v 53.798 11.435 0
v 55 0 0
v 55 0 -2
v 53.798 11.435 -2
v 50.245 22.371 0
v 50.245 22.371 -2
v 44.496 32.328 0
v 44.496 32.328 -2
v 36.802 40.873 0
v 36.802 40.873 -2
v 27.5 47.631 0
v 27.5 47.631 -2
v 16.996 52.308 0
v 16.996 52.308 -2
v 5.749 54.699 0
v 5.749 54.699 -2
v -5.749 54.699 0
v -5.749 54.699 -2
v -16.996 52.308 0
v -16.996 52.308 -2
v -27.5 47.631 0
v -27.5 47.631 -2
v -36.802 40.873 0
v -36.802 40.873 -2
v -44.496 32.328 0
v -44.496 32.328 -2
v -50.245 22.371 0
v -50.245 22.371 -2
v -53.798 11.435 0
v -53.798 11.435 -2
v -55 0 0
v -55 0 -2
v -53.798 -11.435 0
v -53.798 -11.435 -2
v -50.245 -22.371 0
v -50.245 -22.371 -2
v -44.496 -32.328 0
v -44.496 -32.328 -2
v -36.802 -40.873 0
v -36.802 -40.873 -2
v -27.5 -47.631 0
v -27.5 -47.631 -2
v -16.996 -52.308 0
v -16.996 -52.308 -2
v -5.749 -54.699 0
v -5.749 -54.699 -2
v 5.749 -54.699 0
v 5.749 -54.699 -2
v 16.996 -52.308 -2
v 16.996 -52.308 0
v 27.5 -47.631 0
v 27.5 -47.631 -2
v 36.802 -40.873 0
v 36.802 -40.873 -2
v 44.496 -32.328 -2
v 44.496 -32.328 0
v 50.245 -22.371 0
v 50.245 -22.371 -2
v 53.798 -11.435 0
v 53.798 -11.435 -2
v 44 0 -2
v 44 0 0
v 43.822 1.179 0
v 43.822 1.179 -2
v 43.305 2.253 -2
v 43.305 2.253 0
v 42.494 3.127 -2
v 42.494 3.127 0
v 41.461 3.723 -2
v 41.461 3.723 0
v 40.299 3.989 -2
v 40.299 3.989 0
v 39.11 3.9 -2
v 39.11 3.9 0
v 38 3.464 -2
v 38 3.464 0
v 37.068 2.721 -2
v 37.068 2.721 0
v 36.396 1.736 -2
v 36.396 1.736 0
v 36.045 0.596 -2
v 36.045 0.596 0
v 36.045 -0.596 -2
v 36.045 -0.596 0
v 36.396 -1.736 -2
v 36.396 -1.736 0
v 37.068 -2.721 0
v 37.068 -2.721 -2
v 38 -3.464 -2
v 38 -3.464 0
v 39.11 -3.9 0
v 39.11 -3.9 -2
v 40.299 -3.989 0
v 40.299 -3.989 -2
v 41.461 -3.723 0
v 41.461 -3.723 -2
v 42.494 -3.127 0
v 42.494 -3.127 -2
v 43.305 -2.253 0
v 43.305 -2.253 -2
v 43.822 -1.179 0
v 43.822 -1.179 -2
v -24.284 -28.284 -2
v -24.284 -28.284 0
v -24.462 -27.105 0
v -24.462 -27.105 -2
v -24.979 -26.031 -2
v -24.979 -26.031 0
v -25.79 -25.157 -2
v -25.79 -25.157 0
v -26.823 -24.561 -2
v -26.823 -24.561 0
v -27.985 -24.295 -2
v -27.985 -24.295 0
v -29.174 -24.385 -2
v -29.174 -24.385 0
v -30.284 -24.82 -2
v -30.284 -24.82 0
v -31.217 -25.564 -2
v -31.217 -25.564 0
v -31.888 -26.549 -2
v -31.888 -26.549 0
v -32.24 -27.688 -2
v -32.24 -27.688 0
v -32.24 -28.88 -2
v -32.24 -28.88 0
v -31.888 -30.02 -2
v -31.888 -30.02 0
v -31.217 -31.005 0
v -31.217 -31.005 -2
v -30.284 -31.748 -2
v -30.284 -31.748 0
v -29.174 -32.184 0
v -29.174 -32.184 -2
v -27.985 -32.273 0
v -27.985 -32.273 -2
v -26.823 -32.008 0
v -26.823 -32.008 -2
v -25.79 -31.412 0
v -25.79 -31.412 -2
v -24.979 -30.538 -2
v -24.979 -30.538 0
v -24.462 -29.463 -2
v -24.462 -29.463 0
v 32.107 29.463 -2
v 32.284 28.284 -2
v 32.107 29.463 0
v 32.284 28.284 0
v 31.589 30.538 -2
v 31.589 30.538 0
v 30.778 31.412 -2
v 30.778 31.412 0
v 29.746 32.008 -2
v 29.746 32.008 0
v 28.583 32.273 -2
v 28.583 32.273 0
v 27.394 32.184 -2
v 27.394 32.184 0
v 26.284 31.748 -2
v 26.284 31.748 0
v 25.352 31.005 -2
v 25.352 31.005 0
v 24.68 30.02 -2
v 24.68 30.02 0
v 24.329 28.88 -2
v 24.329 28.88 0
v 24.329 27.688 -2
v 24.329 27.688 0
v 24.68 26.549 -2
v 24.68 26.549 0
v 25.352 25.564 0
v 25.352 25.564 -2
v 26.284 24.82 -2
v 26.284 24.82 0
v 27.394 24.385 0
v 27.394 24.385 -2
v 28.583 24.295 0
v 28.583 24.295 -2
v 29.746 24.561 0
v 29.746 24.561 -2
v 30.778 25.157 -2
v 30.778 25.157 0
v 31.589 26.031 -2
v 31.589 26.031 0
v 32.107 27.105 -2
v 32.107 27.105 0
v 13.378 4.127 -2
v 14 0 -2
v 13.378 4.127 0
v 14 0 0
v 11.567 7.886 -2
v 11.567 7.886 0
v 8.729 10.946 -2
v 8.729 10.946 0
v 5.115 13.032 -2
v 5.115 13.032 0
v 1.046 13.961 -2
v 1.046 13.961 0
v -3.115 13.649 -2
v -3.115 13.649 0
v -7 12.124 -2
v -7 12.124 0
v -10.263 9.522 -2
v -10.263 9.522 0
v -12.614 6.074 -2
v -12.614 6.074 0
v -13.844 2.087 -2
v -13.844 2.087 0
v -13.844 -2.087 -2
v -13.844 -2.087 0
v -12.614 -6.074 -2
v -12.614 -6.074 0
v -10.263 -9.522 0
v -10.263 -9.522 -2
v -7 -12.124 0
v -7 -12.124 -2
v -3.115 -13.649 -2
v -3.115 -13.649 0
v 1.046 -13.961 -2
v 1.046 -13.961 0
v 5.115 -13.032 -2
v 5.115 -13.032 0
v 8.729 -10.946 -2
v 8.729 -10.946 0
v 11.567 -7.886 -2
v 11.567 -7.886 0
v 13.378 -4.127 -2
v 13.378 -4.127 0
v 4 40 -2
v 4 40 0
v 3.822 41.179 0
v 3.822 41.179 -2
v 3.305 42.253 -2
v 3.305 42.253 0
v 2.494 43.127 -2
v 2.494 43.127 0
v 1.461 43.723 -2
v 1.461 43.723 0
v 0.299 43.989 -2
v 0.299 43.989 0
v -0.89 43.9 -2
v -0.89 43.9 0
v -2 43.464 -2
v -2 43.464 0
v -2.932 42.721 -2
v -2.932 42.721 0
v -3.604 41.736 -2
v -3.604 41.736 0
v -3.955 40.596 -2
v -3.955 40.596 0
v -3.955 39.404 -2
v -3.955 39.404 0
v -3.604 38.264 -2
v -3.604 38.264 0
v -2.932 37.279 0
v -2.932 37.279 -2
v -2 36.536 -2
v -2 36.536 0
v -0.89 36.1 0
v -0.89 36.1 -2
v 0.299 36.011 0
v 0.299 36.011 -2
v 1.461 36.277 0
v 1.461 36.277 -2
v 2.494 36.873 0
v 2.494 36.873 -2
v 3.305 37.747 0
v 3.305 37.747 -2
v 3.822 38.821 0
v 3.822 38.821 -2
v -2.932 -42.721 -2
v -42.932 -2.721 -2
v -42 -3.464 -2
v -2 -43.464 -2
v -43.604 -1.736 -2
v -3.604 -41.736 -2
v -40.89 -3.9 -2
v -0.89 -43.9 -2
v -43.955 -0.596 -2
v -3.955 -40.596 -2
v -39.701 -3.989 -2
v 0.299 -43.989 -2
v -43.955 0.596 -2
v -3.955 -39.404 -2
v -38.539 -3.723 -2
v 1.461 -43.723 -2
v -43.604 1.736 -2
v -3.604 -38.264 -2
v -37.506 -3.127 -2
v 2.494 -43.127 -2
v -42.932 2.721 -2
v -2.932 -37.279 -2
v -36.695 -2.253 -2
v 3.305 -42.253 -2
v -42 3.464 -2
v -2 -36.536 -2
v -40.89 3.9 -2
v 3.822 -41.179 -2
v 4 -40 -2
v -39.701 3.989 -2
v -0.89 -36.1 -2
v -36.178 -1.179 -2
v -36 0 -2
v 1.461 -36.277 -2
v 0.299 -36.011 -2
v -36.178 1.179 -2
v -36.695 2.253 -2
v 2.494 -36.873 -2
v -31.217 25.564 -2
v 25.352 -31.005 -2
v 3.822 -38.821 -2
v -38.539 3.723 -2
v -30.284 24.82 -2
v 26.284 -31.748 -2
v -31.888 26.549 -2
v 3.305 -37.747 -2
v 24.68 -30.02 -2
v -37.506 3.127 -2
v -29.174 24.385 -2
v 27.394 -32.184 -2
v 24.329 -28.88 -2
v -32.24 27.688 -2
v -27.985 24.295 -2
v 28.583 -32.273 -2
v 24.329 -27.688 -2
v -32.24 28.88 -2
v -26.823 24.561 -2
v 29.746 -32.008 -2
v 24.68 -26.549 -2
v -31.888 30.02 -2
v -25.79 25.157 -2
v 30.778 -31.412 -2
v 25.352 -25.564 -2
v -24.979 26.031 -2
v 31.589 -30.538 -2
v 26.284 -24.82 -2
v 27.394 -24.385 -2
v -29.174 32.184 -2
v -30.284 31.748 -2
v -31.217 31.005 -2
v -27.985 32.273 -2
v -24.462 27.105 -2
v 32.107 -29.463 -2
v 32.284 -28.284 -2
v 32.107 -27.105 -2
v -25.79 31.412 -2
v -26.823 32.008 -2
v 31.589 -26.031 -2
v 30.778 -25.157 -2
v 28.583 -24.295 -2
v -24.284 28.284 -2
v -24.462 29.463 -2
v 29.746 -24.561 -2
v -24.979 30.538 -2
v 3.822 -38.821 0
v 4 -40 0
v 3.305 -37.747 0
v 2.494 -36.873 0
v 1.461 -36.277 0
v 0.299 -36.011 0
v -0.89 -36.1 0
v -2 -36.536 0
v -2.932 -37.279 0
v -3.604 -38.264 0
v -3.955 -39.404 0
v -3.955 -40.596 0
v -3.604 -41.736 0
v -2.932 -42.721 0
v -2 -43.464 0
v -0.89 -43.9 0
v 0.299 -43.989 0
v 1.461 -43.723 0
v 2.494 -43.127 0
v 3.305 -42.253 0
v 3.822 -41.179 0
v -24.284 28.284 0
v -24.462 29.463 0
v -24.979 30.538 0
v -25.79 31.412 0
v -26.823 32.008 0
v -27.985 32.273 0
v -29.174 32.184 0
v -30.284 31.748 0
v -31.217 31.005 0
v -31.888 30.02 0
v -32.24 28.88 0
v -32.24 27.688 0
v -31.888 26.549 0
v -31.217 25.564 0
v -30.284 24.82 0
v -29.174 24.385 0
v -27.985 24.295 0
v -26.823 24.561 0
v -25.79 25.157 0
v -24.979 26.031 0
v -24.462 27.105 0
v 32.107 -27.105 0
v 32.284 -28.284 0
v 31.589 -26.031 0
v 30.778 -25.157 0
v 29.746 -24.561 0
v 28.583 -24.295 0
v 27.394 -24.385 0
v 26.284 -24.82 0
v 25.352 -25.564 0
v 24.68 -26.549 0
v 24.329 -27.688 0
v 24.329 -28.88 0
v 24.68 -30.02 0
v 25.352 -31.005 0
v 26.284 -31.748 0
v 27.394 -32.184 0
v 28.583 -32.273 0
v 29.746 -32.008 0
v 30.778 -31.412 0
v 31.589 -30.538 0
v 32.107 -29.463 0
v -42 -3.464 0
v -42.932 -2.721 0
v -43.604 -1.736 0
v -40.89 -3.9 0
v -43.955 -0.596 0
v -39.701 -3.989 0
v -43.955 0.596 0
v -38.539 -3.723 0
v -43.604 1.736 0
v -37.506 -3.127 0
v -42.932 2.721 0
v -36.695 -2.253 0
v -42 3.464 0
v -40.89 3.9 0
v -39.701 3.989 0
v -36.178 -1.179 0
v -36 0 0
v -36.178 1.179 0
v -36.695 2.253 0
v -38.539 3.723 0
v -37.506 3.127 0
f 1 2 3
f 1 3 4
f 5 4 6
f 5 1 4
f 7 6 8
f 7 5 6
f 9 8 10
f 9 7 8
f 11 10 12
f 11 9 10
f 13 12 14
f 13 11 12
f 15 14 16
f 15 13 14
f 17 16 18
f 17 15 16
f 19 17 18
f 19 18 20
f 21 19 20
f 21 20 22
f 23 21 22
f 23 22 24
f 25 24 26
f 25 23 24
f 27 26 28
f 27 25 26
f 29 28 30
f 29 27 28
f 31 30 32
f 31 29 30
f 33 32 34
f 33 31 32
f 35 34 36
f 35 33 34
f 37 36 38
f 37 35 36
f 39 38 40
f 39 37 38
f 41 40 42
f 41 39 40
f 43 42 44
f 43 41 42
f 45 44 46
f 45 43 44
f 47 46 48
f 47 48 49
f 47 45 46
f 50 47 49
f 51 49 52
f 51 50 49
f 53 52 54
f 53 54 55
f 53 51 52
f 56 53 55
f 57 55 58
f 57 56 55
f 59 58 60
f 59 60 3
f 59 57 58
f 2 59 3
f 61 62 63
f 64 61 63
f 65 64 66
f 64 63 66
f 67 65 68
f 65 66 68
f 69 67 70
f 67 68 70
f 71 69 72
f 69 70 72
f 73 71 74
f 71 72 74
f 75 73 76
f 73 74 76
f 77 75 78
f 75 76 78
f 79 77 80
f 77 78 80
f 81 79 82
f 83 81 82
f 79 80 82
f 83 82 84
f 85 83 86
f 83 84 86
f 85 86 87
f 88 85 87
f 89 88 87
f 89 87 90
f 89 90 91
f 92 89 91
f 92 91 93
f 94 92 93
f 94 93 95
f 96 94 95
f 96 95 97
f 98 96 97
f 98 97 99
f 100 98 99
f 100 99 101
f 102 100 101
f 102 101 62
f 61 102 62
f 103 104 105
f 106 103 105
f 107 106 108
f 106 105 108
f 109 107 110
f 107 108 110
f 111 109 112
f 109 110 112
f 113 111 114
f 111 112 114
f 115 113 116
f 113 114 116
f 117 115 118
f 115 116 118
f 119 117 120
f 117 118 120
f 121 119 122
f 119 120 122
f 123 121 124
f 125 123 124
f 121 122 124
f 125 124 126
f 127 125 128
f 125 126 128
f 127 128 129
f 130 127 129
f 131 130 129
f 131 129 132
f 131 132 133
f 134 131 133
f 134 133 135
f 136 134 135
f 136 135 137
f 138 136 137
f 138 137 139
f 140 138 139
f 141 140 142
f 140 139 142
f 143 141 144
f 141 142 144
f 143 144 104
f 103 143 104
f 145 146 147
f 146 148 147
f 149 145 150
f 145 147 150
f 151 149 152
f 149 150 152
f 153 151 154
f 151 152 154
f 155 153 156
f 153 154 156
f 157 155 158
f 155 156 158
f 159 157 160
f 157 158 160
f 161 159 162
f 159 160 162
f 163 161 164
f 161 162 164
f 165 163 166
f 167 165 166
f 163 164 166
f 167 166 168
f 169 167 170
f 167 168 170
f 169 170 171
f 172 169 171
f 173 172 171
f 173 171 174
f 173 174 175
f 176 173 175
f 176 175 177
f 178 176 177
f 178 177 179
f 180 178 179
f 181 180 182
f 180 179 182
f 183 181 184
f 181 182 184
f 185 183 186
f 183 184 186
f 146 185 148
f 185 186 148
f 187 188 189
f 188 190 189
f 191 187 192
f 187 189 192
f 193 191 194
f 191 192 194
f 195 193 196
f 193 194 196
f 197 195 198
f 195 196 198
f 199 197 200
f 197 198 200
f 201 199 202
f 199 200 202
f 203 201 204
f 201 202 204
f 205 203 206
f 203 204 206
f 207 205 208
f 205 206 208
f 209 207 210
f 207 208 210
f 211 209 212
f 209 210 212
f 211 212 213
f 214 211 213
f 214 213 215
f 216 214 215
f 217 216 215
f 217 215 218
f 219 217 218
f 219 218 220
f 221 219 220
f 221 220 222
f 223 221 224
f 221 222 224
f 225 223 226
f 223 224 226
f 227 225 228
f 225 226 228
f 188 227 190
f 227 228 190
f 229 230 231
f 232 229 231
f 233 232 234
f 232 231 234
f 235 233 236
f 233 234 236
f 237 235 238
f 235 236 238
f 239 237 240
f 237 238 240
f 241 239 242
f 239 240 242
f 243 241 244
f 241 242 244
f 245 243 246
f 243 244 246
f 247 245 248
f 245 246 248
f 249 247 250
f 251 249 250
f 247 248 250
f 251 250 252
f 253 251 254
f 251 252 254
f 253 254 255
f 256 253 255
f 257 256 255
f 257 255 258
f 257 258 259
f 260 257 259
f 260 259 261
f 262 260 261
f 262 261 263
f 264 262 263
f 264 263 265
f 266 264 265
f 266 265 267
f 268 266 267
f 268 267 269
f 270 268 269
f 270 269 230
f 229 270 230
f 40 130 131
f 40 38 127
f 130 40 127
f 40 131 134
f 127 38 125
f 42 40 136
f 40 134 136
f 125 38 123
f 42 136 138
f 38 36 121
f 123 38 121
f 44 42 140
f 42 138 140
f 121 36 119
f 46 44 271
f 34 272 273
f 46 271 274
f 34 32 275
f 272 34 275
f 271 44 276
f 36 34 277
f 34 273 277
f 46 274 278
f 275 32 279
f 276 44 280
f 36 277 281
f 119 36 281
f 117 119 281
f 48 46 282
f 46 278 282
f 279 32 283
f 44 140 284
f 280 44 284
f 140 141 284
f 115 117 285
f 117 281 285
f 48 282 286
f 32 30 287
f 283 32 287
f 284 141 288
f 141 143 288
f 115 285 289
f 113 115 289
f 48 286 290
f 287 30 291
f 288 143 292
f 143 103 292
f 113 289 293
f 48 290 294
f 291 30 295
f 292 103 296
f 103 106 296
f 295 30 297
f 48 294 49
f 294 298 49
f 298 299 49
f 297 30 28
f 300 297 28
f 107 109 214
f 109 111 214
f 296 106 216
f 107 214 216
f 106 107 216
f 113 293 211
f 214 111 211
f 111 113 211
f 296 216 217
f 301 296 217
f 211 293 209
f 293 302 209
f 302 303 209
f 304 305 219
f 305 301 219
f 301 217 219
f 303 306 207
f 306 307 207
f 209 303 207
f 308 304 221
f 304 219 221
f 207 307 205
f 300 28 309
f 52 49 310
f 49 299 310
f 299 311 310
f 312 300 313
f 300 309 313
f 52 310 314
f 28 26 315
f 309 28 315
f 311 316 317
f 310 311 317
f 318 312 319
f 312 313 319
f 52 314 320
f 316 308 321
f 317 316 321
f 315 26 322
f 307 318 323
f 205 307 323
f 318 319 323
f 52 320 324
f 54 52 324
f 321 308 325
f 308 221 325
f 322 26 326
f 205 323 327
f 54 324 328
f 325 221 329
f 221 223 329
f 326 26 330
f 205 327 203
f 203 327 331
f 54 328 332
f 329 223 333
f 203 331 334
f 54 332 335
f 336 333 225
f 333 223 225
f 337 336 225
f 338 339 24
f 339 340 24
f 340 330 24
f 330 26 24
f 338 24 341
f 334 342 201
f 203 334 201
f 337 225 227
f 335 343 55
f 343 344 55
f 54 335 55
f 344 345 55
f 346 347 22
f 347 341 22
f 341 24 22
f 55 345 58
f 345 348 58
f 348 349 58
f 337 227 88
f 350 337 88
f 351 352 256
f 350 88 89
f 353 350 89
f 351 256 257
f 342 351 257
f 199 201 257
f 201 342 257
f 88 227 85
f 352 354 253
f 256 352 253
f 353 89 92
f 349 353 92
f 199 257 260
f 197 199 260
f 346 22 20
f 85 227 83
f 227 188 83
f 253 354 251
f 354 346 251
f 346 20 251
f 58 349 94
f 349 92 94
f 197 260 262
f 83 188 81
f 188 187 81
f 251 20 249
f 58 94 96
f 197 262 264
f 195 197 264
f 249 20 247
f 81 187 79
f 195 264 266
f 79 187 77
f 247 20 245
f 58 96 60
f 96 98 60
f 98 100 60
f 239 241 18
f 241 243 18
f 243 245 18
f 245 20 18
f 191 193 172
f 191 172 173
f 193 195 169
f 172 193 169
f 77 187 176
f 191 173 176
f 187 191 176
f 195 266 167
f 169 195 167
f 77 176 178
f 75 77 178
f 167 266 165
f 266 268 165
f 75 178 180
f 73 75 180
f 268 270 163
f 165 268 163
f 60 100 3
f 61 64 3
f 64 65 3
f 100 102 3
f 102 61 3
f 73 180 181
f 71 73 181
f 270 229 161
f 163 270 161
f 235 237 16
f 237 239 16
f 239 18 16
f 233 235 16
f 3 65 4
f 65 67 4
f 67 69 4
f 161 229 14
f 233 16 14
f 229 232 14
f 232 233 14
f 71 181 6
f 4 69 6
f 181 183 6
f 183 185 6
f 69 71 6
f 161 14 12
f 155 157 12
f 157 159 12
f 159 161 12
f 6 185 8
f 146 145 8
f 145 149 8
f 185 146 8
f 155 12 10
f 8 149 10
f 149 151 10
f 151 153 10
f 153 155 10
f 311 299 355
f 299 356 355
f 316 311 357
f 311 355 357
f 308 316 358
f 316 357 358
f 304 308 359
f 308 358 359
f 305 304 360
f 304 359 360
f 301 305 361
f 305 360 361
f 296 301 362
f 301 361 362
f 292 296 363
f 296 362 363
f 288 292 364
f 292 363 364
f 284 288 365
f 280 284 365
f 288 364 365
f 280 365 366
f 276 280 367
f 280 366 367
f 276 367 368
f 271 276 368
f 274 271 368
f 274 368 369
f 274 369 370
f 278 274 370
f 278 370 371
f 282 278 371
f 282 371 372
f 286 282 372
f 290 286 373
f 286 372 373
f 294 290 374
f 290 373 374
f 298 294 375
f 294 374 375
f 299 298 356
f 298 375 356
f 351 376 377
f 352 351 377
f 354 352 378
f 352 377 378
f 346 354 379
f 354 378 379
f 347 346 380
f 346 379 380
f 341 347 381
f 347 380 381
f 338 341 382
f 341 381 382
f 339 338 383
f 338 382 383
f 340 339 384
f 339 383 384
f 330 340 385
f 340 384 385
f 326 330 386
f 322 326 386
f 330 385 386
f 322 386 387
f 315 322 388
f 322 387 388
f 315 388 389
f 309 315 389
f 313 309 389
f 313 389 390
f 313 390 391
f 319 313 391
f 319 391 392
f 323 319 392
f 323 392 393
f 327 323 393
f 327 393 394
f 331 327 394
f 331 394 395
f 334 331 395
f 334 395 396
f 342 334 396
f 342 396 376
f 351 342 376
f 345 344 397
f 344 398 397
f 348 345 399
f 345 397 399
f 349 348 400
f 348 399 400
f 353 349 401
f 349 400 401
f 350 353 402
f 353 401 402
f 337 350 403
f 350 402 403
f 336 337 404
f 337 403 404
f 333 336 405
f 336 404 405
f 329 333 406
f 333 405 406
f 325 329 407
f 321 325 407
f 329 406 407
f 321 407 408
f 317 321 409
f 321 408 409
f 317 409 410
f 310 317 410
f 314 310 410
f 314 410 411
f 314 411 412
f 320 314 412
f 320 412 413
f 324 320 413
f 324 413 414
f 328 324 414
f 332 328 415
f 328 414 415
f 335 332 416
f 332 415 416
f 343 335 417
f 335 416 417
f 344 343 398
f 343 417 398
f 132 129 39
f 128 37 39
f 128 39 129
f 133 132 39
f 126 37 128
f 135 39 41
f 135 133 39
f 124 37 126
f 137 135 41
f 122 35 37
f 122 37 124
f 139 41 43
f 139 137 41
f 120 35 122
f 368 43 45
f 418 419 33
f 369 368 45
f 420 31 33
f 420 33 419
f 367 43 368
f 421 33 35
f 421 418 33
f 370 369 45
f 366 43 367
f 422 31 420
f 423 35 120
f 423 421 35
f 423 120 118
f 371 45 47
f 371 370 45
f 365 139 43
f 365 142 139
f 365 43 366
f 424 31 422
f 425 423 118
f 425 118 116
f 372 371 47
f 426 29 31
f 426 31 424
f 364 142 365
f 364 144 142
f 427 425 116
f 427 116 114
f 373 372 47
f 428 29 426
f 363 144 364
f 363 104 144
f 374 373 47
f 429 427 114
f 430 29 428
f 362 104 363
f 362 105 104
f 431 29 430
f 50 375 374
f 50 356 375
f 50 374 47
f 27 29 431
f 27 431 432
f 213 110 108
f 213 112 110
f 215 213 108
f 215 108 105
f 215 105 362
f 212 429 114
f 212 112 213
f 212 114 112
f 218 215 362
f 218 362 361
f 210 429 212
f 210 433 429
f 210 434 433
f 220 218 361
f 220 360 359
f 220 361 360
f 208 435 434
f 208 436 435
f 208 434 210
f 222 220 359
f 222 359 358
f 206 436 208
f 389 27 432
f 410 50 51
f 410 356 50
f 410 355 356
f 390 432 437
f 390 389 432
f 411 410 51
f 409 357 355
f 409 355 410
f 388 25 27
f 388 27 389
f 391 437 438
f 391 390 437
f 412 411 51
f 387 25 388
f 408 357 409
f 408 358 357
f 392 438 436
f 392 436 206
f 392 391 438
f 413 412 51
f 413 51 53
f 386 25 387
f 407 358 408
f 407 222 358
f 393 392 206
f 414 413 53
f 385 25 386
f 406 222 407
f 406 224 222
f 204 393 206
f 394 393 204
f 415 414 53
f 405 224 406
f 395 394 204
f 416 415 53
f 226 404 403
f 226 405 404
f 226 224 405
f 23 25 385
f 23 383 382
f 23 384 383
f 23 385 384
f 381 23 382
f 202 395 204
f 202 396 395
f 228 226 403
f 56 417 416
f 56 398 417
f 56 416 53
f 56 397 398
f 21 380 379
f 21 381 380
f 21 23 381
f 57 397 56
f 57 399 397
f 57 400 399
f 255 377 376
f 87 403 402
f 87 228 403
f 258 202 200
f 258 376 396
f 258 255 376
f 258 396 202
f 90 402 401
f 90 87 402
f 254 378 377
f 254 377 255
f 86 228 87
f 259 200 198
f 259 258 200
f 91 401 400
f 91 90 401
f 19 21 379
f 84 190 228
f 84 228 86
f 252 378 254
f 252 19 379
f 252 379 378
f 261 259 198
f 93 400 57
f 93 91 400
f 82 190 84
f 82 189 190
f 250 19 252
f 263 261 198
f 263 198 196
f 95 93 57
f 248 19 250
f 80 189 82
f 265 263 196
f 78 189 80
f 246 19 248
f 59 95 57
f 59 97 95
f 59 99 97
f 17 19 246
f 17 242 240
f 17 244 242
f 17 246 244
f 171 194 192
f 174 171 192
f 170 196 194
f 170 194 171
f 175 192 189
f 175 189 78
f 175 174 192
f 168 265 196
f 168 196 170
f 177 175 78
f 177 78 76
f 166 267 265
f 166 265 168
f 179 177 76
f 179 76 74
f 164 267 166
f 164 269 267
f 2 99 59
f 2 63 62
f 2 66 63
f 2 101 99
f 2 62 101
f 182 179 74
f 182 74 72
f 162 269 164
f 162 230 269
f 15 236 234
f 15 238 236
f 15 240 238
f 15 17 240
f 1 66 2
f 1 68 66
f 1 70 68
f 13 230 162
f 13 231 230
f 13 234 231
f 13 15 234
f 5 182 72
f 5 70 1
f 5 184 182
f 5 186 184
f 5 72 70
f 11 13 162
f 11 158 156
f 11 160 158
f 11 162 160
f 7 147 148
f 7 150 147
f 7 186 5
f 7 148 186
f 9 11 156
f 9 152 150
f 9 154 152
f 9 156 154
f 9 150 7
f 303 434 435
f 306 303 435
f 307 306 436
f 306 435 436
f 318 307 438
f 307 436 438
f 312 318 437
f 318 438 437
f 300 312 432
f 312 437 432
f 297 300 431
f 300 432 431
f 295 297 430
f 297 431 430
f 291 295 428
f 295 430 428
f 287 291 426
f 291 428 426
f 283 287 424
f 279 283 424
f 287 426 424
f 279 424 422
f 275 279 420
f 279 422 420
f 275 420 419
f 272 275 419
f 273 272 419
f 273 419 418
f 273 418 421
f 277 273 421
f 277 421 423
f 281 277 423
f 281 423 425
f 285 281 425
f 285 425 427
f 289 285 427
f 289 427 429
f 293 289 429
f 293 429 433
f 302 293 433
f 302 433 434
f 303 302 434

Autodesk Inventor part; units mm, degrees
ref_plane "YZ Plane" through (0, 0, 0) normal (1, 0, 0) x (0, 1, 0)
ref_plane "XZ Plane" through (0, 0, 0) normal (0, 1, 0) x (-1, 0, 0)
ref_plane "XY Plane" through (0, 0, 0) normal (0, 0, 1) x (1, 0, 0)
sketch "Sketch1" plane through (0, 0, 0) normal (0, 0, 1) x (1, 0, 0)
  circle A0 centre (0, 0) radius 55
  circle A1 centre (0, 0) radius 14
  circle A2 centre (0, 0) radius 40 construction
  circle A3 centre (40, 0) radius 4
  circle A4 centre (28.2843, 28.2843) radius 4
  circle A5 centre (0, 40) radius 4
  circle A6 centre (-28.2843, 28.2843) radius 4
  circle A7 centre (-40, 0) radius 4
  circle A8 centre (-28.2843, -28.2843) radius 4
  circle A9 centre (0, -40) radius 4
  circle A10 centre (28.2843, -28.2843) radius 4
  dimension "d39" = 80
  dimension "d31" = 28
  dimension "d32" = 110
  dimension "d40" = 8
  dimension "d43" = 360
extrude "Plate1" add sketch "Sketch1" against normal blind 2
equation "\"d15\" = Thickness"
equation "\"BendRadius\" = Thickness"
equation "\"BendReliefWidth\" = Thickness"
equation "\"BendReliefDepth\" = 0.5 * Thickness"
equation "\"CornerReliefSize\" = 4 * Thickness"
equation "\"MinimumRemnant\" = 2 * Thickness"
equation "\"TransitionRadius\" = BendRadius"
equation "\"JacobiRadiusSize\" = BendRadius"
equation "\"GapSize\" = Thickness"
equation "\"Thickness\" = 2"
properties part number "flange small gear"
